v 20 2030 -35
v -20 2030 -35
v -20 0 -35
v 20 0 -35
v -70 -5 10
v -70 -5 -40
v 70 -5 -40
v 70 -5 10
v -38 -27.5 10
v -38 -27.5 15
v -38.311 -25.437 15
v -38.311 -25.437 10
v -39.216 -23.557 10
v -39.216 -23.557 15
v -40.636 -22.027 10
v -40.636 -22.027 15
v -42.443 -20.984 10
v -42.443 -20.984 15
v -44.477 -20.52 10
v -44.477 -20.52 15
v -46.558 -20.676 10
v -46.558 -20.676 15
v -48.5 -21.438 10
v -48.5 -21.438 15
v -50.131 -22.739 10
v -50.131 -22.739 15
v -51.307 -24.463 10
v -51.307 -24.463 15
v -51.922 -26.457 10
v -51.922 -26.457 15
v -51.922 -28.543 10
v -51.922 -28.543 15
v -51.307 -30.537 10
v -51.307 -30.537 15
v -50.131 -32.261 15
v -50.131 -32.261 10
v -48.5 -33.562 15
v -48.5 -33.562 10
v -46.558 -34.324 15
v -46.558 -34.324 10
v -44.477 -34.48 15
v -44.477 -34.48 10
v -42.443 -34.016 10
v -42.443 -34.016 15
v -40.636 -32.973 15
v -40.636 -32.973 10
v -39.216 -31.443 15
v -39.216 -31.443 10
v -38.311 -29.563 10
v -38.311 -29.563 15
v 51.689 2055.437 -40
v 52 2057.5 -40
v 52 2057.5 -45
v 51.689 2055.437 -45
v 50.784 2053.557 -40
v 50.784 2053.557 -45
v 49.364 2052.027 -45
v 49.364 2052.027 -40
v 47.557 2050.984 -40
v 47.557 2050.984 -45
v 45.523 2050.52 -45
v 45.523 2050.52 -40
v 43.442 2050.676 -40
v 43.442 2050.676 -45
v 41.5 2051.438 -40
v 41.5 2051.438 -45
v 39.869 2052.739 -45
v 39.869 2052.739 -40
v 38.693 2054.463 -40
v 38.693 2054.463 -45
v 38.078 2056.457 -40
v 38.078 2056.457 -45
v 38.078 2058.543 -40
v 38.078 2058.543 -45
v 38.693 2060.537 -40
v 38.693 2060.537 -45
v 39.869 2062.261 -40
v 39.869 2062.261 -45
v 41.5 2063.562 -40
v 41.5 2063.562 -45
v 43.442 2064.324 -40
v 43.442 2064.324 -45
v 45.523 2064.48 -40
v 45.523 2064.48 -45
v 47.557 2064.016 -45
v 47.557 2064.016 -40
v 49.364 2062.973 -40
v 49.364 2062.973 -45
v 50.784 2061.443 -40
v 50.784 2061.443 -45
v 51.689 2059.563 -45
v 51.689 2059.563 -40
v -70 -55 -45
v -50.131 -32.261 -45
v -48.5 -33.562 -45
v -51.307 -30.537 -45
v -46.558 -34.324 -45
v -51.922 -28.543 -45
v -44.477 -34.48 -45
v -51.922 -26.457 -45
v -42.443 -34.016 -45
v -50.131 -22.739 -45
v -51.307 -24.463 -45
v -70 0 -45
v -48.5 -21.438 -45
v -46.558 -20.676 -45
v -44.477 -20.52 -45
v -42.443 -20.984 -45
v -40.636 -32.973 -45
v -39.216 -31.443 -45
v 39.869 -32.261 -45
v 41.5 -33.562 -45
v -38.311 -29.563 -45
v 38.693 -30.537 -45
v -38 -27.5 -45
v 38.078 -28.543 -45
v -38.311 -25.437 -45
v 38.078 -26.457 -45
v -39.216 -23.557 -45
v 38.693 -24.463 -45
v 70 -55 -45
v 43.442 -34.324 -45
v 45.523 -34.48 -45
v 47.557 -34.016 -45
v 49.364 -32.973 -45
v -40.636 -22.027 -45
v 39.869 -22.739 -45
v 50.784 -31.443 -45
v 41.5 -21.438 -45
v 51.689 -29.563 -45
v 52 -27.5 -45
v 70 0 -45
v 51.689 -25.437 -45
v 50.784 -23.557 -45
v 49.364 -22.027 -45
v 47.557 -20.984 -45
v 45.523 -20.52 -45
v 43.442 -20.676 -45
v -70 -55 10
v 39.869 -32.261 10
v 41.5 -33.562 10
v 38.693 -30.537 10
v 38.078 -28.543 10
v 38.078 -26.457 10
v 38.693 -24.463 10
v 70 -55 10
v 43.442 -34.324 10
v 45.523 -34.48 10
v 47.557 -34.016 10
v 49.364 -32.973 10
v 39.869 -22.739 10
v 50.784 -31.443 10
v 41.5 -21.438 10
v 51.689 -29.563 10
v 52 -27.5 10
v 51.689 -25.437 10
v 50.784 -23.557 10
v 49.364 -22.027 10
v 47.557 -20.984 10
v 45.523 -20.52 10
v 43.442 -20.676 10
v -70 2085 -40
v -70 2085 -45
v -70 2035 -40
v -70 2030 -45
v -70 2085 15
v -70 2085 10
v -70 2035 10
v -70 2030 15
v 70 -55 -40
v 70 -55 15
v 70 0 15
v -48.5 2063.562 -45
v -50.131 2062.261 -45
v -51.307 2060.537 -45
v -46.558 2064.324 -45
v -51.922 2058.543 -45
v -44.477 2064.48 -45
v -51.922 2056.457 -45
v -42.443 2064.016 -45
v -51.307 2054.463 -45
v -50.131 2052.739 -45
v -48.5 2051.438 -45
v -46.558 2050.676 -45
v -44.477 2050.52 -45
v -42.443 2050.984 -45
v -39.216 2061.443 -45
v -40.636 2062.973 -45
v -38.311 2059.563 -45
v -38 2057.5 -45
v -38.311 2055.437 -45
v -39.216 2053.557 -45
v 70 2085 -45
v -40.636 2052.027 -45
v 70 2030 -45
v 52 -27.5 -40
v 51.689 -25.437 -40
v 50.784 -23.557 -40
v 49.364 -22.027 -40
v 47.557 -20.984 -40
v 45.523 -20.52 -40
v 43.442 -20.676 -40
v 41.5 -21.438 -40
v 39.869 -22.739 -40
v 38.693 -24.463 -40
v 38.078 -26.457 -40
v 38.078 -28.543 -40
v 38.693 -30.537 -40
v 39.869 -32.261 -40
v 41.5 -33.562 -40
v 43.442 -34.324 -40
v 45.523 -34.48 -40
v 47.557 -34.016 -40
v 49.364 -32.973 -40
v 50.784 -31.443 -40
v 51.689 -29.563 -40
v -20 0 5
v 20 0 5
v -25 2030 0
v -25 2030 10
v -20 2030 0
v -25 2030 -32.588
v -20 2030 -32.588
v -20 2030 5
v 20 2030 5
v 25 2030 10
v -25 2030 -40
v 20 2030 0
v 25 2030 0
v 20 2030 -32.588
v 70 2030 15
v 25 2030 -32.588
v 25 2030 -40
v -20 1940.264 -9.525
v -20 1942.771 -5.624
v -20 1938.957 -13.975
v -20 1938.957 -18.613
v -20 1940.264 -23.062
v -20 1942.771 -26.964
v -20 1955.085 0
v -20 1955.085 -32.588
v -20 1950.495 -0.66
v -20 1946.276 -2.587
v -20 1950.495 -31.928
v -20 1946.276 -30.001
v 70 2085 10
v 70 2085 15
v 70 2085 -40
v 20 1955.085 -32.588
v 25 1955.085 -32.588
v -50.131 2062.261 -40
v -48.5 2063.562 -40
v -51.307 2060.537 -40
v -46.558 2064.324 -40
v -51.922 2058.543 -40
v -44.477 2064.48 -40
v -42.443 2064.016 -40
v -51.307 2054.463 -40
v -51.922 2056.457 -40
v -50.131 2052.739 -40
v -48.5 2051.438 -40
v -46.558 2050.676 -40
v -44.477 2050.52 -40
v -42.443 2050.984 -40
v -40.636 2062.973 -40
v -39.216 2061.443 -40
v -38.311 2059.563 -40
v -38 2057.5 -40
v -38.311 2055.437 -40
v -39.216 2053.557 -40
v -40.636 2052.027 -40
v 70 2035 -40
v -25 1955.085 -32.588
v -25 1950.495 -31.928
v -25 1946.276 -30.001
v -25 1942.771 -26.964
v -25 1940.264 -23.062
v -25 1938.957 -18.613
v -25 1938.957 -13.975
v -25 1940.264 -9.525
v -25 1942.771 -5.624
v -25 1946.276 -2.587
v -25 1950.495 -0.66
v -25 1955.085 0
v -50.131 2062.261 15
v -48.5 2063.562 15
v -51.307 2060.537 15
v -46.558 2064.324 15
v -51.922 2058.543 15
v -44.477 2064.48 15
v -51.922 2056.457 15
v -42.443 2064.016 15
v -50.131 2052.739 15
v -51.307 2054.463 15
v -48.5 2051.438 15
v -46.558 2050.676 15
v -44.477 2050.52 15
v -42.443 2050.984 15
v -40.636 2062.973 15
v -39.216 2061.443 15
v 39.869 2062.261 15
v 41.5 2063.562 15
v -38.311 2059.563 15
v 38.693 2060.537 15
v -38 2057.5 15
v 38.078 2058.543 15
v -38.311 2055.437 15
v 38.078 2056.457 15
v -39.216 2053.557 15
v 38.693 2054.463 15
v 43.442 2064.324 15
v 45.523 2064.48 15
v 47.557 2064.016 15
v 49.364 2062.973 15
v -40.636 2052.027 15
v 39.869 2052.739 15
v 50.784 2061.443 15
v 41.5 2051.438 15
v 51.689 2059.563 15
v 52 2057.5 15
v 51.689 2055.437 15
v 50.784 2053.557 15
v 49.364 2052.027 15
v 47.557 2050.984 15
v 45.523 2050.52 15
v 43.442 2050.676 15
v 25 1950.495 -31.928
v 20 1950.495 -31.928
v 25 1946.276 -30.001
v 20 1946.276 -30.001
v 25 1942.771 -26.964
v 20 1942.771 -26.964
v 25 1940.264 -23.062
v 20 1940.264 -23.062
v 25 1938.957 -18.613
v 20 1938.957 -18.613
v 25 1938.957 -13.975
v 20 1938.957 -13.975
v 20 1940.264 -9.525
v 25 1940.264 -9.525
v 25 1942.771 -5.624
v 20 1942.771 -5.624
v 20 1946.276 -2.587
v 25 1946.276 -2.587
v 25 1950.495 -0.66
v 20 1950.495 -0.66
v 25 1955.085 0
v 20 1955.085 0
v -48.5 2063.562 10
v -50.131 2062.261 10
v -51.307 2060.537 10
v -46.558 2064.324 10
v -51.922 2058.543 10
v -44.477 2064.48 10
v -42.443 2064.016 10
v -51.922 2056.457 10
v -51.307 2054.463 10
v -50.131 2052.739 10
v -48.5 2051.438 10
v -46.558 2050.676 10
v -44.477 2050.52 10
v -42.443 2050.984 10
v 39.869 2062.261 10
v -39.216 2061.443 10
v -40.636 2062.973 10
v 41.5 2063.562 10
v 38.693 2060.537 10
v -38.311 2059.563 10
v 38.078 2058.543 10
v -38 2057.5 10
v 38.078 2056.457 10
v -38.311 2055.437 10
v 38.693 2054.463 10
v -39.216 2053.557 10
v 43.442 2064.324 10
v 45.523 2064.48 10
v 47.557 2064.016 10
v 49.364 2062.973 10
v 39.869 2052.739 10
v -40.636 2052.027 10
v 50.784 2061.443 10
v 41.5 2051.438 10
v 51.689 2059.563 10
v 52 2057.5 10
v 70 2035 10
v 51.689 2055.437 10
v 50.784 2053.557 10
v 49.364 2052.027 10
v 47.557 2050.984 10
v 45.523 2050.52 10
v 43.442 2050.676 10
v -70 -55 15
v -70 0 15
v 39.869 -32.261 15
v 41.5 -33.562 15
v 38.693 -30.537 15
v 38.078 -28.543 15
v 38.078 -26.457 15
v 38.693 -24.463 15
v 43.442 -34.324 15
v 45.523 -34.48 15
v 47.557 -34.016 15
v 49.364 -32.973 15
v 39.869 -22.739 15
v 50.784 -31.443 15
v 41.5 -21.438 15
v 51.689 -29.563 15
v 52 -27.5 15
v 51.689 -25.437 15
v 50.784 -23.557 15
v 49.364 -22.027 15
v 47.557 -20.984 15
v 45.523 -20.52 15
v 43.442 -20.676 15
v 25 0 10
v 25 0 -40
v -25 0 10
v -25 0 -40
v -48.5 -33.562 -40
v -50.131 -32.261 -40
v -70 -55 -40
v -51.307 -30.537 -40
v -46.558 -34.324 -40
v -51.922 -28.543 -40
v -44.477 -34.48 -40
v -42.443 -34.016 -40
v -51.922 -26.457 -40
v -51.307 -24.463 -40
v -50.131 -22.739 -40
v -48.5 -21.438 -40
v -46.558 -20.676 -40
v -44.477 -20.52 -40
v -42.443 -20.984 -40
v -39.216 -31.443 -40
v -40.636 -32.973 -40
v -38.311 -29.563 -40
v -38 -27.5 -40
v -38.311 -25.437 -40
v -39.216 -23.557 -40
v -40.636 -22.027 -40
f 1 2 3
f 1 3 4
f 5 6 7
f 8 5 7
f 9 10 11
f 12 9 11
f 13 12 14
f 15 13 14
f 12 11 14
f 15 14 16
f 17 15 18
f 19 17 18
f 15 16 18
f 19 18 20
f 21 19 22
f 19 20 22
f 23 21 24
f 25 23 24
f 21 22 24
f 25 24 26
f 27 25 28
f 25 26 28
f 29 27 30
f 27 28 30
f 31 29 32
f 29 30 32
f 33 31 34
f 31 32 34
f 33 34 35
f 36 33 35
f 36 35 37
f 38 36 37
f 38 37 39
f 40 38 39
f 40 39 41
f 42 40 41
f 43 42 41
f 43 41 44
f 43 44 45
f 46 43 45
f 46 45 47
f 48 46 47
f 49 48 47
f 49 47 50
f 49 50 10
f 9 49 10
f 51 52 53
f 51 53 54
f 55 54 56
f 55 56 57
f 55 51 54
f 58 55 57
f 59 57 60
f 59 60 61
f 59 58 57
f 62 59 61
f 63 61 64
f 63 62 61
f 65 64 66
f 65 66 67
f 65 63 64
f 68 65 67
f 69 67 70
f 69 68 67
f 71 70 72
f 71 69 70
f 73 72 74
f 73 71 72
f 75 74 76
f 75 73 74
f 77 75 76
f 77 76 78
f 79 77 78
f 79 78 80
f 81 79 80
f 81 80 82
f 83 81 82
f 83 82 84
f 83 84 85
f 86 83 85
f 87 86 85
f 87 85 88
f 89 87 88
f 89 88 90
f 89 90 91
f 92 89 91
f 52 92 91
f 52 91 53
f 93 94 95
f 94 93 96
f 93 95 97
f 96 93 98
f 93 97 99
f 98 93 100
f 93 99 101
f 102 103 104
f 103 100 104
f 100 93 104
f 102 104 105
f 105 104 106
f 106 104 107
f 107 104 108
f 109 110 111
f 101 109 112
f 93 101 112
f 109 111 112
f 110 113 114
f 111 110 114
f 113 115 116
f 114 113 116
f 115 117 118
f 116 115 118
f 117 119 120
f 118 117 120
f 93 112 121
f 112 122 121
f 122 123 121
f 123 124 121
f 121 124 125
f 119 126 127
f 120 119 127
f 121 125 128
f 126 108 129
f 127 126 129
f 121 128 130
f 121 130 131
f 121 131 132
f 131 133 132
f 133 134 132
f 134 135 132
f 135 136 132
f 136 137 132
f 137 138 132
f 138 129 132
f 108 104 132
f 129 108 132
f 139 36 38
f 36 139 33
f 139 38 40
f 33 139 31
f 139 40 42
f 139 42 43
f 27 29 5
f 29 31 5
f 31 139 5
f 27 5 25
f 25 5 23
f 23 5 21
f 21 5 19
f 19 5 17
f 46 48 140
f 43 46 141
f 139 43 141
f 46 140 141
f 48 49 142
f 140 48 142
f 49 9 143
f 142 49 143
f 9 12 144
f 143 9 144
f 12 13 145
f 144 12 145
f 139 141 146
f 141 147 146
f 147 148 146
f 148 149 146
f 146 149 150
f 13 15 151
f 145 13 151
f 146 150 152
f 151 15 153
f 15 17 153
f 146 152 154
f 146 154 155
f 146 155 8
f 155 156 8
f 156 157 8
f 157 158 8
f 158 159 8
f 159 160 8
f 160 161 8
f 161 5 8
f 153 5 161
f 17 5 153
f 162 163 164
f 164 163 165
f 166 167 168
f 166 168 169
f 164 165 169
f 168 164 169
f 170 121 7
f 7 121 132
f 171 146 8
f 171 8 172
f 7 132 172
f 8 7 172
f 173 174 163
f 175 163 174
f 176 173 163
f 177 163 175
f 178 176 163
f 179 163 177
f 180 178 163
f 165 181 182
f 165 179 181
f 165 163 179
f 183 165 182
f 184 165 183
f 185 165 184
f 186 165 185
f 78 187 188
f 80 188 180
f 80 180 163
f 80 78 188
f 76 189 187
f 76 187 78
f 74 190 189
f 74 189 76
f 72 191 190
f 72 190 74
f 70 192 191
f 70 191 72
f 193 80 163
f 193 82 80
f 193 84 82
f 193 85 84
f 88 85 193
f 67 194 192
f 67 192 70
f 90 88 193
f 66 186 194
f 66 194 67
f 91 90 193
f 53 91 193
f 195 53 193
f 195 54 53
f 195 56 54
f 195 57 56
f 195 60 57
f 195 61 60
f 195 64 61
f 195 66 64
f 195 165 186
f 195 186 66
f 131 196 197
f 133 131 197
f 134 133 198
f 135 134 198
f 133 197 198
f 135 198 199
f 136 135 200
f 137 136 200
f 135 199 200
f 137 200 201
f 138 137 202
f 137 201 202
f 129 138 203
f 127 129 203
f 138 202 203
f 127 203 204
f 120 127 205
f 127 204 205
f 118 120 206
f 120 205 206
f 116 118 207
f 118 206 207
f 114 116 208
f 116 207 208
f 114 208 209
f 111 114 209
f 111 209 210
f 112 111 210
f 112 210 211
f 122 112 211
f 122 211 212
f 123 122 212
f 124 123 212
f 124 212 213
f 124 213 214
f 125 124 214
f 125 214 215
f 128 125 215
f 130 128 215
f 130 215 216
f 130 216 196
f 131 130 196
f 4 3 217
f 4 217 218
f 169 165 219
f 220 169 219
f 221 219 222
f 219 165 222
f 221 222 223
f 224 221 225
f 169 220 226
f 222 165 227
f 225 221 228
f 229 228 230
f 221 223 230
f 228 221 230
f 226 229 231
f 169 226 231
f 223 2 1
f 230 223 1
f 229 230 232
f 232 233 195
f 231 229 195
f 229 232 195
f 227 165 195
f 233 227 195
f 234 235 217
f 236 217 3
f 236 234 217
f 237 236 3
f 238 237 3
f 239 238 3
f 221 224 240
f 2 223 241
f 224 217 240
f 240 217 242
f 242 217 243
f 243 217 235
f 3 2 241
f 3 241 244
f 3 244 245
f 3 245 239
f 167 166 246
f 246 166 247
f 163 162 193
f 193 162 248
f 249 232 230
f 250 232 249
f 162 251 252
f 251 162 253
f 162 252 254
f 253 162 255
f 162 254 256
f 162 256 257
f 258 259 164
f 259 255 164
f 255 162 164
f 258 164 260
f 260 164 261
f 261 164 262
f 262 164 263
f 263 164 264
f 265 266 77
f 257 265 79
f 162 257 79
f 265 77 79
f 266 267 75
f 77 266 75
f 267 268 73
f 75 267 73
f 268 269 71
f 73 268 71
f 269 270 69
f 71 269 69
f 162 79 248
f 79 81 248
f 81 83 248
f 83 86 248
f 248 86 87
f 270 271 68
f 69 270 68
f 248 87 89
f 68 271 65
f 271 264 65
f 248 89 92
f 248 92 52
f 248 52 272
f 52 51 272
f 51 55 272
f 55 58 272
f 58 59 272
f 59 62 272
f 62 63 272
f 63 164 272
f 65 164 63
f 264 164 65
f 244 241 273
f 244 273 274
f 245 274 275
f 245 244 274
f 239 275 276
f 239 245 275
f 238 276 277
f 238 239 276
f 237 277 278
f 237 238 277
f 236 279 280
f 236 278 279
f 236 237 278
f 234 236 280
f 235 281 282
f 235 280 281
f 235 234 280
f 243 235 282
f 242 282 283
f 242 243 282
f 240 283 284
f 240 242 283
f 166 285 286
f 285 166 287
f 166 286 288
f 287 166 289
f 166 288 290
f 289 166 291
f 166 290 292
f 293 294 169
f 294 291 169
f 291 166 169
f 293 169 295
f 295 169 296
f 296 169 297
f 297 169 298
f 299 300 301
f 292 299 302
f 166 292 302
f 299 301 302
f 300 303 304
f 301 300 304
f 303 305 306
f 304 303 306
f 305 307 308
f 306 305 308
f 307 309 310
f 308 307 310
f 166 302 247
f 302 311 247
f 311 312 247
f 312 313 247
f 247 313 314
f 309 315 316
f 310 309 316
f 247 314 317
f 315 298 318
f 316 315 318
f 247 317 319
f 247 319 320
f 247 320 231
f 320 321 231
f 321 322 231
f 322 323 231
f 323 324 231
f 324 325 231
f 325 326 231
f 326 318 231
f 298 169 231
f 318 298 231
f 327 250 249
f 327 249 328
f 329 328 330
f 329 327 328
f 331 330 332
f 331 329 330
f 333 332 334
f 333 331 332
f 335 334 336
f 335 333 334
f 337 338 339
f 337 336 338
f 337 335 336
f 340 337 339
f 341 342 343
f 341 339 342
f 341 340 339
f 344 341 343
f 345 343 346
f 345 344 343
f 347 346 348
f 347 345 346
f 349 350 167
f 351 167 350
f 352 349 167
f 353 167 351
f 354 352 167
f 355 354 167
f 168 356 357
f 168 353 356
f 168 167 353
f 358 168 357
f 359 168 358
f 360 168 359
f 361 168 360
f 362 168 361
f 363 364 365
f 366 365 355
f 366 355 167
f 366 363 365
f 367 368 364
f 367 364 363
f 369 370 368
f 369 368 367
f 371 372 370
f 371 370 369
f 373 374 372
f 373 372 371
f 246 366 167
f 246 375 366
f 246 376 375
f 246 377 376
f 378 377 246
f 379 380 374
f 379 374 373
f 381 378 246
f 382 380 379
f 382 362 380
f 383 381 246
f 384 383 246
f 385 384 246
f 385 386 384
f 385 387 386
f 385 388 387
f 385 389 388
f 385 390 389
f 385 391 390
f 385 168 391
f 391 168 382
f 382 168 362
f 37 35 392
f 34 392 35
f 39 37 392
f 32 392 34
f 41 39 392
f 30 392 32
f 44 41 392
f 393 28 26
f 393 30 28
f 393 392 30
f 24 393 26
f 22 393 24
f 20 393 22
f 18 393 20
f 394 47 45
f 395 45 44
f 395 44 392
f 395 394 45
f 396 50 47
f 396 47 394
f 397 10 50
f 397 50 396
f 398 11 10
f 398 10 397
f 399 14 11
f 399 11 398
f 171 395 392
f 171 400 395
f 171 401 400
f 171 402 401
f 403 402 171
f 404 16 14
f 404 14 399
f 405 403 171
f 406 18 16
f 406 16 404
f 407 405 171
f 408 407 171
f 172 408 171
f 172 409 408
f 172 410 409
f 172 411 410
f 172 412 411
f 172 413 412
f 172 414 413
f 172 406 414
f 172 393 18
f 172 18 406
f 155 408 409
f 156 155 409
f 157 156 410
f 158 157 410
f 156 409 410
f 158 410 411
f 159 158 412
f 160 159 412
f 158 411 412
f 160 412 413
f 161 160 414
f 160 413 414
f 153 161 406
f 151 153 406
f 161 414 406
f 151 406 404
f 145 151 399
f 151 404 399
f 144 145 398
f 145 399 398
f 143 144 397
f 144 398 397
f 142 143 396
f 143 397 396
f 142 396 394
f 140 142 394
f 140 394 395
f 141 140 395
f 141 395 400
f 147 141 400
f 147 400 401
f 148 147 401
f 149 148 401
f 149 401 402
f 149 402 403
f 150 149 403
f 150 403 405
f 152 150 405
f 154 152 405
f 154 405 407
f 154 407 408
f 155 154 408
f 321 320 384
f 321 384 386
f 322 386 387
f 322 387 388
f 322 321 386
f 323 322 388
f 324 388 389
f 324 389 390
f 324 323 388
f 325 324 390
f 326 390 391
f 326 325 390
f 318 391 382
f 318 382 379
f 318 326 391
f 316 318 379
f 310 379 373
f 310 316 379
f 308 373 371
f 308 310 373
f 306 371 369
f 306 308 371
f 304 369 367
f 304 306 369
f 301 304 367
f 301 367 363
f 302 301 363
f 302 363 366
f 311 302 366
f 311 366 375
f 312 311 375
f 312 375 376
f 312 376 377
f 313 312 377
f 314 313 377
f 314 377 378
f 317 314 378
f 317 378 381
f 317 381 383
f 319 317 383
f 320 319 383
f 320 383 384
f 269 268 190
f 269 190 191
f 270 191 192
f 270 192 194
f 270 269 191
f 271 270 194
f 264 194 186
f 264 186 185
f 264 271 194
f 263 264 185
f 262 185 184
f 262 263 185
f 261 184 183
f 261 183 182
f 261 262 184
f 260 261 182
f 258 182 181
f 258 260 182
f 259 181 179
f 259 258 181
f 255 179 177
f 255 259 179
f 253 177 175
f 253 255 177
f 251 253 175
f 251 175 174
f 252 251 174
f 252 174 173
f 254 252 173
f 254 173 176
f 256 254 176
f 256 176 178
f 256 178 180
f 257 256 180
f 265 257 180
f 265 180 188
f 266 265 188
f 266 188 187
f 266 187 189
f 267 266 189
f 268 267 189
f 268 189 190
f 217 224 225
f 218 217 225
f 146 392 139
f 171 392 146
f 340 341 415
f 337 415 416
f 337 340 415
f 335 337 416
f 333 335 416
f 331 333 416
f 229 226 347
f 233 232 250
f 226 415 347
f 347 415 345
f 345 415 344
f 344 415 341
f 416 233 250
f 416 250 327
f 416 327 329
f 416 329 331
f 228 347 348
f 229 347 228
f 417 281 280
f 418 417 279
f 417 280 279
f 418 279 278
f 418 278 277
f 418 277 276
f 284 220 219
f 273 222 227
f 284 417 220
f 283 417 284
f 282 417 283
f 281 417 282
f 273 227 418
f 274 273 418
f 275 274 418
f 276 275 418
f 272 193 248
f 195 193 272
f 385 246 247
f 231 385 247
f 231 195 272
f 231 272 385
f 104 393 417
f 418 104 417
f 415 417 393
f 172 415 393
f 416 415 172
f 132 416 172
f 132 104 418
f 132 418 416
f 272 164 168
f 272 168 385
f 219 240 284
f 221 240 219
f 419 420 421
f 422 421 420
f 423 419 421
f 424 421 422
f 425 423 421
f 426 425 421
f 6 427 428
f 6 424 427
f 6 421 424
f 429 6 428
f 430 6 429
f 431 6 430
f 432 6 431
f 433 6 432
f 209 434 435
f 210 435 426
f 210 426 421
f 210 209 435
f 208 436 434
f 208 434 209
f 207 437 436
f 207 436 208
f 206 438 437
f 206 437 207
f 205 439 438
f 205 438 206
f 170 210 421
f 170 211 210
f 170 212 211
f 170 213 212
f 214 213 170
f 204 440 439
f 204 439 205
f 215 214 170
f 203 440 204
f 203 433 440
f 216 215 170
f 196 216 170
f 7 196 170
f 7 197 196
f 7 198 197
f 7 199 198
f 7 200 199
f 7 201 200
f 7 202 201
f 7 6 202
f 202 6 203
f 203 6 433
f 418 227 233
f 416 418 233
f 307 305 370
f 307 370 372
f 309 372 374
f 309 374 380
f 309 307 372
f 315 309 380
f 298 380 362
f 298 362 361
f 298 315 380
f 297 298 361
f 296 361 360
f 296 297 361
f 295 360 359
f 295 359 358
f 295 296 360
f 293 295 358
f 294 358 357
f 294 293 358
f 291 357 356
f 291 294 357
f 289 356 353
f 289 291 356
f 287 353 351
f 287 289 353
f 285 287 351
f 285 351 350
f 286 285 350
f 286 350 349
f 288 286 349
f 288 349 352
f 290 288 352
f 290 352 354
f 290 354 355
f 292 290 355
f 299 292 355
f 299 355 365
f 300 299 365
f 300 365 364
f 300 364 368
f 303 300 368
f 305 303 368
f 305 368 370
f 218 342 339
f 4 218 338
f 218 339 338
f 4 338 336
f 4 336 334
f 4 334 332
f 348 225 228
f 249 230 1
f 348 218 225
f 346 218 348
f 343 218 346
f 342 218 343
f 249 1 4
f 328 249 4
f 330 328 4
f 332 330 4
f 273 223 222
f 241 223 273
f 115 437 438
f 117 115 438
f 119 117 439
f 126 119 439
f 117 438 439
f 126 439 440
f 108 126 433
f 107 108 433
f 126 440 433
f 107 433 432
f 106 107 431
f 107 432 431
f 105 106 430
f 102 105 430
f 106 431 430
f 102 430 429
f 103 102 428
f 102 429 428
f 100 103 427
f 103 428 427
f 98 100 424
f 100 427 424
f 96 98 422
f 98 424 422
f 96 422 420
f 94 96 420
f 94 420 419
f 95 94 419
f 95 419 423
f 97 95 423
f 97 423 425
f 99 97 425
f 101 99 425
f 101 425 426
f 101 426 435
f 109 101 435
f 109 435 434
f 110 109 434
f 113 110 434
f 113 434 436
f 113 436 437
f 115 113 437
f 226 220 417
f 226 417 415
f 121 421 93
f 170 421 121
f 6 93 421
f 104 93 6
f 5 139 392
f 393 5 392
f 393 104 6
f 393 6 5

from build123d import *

# Parameters (mm, degrees)
SKETCH1_W               = 140
SKETCH1_H               = 60
BOSS_EXTRUDE1_DEPTH     = 5
SKETCH2_W               = 140
SKETCH2_H               = 5
BOSS_EXTRUDE3_DEPTH     = 50
SKETCH4_R               = 7
CUT_EXTRUDE1_DEPTH      = 108.354552768
SKETCH5_W               = 50
SKETCH5_H               = 50
SKETCH5_W_2             = 40
SKETCH5_H_2             = 40
BOSS_EXTRUDE4_DEPTH     = 1015
CUT_EXTRUDE3_DEPTH      = 2088.648198332
CUT_EXTRUDE3_DEPTH_BACK = 2088.648198332


with BuildPart() as part:
    # Sketch1 → Boss-Extrude1 (new body)
    with BuildSketch(Plane(origin=(0, 0, 0), x_dir=(1, 0, 0), z_dir=(0, 1, 0))):
        with Locations((0, 15)):
            Rectangle(SKETCH1_W, SKETCH1_H)
    extrude(amount=-BOSS_EXTRUDE1_DEPTH)

    # Sketch2 → Boss-Extrude3 (add)
    with BuildSketch(Plane.XZ.offset(5)):
        with Locations((0, 12.5)):
            Rectangle(SKETCH2_W, SKETCH2_H)
        with Locations((0, -42.5)):
            Rectangle(SKETCH2_W, SKETCH2_H)
    extrude(amount=BOSS_EXTRUDE3_DEPTH)

    # Sketch4 → Cut-Extrude1 (cut, through all)
    with BuildSketch(Plane.XY.offset(15)):
        with Locations((-45, -27.5)):
            Circle(SKETCH4_R)
        with Locations((45, -27.5)):
            Circle(SKETCH4_R)
    extrude(amount=-CUT_EXTRUDE1_DEPTH, mode=Mode.SUBTRACT)

    # Sketch5 → Boss-Extrude4 (add)
    with BuildSketch(Plane(origin=(0, 0, 0), x_dir=(1, 0, 0), z_dir=(0, 1, 0))):
        with Locations((0, 15)):
            Rectangle(SKETCH5_W, SKETCH5_H)
        with Locations((0, 15)):
            Rectangle(SKETCH5_W_2, SKETCH5_H_2, mode=Mode.SUBTRACT)
    extrude(amount=BOSS_EXTRUDE4_DEPTH)

    # Mirror1: part across plane


with BuildPart() as part_1:
    add(part.part)
    add(part.part.mirror(Plane.ZX.offset(1015)))

    # Sketch8 → Cut-Extrude3 (cut, two sides: drawn at the far end of the back side and taken through both)
    with BuildSketch(Plane.ZY.offset(25).offset(-CUT_EXTRUDE3_DEPTH_BACK)):
        with BuildLine():
            Line((-32.587539874, 2030), (-32.587539874, 1955.085156016))
            ThreePointArc((-32.587539874, 1955.085156016), (-16.293769937, 1938.791386079), (0, 1955.085156016))
            Line((0, 1955.085156016), (0, 2030))
            Line((0, 2030), (-32.587539874, 2030))
        make_face()
    extrude(amount=CUT_EXTRUDE3_DEPTH + CUT_EXTRUDE3_DEPTH_BACK, mode=Mode.SUBTRACT)


solid = part_1.part
